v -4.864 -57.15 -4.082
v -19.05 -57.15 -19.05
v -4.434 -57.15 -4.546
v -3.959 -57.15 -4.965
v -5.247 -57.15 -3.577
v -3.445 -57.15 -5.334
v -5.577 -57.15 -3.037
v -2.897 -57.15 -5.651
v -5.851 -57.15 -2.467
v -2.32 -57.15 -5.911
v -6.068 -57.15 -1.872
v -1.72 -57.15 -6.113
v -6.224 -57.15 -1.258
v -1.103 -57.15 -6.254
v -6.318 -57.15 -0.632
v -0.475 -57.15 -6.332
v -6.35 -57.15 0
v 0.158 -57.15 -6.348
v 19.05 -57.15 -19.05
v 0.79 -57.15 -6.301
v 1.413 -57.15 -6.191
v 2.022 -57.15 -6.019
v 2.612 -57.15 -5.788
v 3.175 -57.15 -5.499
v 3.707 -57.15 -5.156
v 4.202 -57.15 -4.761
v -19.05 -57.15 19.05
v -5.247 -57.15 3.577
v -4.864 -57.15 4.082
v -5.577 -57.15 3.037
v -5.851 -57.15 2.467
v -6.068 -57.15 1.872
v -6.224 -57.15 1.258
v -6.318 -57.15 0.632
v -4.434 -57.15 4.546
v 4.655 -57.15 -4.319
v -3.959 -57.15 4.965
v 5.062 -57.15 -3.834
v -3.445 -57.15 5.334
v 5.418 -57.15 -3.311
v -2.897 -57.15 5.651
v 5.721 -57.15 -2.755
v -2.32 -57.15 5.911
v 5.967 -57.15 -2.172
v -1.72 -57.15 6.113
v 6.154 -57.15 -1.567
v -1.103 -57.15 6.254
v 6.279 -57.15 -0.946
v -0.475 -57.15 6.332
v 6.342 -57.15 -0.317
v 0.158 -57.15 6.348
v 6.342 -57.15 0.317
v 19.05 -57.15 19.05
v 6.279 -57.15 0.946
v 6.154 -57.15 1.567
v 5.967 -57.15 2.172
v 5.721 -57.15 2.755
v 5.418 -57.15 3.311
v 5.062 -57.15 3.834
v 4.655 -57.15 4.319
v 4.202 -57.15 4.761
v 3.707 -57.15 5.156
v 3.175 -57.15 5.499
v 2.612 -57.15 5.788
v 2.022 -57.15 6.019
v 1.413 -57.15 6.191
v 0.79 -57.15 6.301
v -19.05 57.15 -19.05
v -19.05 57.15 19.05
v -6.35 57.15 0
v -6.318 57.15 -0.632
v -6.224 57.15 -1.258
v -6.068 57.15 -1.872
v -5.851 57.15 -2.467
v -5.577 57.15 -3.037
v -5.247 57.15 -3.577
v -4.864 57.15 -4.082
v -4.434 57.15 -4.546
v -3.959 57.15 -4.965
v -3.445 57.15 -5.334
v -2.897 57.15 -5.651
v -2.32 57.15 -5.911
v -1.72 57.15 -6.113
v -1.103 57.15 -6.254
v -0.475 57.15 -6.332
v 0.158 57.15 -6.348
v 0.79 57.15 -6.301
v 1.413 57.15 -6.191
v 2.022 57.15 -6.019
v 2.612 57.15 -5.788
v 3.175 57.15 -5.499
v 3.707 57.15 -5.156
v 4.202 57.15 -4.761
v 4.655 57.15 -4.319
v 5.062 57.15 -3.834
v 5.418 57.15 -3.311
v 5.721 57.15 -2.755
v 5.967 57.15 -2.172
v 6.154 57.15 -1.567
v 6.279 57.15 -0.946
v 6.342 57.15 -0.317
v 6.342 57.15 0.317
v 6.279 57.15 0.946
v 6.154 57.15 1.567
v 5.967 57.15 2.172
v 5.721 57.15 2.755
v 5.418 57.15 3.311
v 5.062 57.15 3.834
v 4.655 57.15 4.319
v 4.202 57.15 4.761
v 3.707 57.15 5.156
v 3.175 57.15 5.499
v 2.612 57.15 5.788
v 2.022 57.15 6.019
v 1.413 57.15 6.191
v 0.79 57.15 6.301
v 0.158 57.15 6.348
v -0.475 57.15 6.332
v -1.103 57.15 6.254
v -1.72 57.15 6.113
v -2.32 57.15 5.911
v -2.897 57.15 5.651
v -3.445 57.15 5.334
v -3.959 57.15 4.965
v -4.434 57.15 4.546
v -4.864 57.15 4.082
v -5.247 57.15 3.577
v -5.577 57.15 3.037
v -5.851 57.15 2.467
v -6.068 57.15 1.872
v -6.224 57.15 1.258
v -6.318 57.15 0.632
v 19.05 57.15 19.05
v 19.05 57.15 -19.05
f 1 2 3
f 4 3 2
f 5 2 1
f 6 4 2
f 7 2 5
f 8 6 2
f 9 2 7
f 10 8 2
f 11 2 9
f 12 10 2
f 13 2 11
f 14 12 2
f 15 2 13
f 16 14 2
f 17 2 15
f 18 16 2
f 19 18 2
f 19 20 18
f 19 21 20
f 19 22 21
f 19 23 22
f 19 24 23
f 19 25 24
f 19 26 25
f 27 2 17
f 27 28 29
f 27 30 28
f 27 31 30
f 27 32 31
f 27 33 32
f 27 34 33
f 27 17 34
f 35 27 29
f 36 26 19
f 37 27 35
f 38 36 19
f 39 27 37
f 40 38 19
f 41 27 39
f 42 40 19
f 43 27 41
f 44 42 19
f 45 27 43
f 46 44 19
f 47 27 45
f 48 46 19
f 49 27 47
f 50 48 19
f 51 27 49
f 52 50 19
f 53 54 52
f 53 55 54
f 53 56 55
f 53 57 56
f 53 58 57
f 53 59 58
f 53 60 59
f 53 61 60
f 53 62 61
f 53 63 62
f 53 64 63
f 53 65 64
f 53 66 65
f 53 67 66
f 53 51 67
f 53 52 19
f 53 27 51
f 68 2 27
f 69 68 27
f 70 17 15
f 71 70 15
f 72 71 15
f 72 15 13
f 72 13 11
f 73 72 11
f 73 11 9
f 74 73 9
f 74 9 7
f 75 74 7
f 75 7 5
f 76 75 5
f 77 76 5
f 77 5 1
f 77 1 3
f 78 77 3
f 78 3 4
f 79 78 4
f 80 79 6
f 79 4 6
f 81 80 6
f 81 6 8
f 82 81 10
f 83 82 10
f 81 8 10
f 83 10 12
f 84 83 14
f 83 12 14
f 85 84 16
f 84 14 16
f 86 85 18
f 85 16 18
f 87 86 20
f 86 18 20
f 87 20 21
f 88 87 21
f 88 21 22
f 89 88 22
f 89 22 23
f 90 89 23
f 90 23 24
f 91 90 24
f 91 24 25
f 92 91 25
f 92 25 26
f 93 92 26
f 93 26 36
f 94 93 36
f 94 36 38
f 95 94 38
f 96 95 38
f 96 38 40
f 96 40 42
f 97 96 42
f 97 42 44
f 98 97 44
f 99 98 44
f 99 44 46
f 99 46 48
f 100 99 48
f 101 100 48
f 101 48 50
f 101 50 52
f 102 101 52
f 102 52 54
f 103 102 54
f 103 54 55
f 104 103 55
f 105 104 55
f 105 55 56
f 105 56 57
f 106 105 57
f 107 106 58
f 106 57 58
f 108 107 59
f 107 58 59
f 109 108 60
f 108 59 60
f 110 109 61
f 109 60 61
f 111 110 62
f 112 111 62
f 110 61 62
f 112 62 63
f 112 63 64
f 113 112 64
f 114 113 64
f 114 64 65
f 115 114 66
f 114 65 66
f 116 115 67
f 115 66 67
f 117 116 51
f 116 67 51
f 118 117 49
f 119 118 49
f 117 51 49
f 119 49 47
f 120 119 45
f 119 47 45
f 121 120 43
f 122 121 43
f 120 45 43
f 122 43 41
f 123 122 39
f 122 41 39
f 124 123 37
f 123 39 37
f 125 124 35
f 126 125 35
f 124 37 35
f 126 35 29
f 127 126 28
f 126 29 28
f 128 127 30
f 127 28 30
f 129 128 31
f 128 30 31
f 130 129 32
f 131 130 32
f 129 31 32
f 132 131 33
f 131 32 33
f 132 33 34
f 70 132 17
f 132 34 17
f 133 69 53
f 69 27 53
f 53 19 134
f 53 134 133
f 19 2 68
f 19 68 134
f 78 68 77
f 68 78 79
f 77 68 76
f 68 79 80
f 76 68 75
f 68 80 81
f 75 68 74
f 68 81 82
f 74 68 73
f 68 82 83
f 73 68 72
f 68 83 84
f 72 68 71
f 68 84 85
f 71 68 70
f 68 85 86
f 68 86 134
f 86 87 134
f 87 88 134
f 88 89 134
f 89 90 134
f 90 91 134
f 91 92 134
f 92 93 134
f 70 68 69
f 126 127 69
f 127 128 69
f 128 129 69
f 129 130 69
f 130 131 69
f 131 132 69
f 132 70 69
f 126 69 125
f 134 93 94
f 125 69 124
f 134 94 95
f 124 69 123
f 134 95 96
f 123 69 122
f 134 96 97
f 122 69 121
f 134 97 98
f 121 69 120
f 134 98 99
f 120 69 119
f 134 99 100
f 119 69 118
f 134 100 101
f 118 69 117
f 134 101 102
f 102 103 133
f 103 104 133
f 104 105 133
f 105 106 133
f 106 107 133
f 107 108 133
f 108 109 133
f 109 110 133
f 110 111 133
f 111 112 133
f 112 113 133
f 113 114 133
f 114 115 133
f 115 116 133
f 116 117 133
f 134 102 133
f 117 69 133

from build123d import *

# Parameters (mm, degrees)
F0_W     = 38.1
F0_H     = 38.1
F1_DEPTH = 57.15
F4_D     = 12.7
F4_DEPTH = 609.6


with BuildPart() as f1:
    # F0 (on Front) → F1 (new body, symmetric)
    with BuildSketch(Plane.XZ):
        Rectangle(F0_W, F0_H)
    extrude(amount=F1_DEPTH, both=True)

    # F4
    with Locations(Plane(origin=(0, 152.4, 0), x_dir=(1, 0, 0), z_dir=(0, 1, 0))):
        with Locations((0, 0)):
            Hole(F4_D / 2, depth=F4_DEPTH)


solid = f1.part
